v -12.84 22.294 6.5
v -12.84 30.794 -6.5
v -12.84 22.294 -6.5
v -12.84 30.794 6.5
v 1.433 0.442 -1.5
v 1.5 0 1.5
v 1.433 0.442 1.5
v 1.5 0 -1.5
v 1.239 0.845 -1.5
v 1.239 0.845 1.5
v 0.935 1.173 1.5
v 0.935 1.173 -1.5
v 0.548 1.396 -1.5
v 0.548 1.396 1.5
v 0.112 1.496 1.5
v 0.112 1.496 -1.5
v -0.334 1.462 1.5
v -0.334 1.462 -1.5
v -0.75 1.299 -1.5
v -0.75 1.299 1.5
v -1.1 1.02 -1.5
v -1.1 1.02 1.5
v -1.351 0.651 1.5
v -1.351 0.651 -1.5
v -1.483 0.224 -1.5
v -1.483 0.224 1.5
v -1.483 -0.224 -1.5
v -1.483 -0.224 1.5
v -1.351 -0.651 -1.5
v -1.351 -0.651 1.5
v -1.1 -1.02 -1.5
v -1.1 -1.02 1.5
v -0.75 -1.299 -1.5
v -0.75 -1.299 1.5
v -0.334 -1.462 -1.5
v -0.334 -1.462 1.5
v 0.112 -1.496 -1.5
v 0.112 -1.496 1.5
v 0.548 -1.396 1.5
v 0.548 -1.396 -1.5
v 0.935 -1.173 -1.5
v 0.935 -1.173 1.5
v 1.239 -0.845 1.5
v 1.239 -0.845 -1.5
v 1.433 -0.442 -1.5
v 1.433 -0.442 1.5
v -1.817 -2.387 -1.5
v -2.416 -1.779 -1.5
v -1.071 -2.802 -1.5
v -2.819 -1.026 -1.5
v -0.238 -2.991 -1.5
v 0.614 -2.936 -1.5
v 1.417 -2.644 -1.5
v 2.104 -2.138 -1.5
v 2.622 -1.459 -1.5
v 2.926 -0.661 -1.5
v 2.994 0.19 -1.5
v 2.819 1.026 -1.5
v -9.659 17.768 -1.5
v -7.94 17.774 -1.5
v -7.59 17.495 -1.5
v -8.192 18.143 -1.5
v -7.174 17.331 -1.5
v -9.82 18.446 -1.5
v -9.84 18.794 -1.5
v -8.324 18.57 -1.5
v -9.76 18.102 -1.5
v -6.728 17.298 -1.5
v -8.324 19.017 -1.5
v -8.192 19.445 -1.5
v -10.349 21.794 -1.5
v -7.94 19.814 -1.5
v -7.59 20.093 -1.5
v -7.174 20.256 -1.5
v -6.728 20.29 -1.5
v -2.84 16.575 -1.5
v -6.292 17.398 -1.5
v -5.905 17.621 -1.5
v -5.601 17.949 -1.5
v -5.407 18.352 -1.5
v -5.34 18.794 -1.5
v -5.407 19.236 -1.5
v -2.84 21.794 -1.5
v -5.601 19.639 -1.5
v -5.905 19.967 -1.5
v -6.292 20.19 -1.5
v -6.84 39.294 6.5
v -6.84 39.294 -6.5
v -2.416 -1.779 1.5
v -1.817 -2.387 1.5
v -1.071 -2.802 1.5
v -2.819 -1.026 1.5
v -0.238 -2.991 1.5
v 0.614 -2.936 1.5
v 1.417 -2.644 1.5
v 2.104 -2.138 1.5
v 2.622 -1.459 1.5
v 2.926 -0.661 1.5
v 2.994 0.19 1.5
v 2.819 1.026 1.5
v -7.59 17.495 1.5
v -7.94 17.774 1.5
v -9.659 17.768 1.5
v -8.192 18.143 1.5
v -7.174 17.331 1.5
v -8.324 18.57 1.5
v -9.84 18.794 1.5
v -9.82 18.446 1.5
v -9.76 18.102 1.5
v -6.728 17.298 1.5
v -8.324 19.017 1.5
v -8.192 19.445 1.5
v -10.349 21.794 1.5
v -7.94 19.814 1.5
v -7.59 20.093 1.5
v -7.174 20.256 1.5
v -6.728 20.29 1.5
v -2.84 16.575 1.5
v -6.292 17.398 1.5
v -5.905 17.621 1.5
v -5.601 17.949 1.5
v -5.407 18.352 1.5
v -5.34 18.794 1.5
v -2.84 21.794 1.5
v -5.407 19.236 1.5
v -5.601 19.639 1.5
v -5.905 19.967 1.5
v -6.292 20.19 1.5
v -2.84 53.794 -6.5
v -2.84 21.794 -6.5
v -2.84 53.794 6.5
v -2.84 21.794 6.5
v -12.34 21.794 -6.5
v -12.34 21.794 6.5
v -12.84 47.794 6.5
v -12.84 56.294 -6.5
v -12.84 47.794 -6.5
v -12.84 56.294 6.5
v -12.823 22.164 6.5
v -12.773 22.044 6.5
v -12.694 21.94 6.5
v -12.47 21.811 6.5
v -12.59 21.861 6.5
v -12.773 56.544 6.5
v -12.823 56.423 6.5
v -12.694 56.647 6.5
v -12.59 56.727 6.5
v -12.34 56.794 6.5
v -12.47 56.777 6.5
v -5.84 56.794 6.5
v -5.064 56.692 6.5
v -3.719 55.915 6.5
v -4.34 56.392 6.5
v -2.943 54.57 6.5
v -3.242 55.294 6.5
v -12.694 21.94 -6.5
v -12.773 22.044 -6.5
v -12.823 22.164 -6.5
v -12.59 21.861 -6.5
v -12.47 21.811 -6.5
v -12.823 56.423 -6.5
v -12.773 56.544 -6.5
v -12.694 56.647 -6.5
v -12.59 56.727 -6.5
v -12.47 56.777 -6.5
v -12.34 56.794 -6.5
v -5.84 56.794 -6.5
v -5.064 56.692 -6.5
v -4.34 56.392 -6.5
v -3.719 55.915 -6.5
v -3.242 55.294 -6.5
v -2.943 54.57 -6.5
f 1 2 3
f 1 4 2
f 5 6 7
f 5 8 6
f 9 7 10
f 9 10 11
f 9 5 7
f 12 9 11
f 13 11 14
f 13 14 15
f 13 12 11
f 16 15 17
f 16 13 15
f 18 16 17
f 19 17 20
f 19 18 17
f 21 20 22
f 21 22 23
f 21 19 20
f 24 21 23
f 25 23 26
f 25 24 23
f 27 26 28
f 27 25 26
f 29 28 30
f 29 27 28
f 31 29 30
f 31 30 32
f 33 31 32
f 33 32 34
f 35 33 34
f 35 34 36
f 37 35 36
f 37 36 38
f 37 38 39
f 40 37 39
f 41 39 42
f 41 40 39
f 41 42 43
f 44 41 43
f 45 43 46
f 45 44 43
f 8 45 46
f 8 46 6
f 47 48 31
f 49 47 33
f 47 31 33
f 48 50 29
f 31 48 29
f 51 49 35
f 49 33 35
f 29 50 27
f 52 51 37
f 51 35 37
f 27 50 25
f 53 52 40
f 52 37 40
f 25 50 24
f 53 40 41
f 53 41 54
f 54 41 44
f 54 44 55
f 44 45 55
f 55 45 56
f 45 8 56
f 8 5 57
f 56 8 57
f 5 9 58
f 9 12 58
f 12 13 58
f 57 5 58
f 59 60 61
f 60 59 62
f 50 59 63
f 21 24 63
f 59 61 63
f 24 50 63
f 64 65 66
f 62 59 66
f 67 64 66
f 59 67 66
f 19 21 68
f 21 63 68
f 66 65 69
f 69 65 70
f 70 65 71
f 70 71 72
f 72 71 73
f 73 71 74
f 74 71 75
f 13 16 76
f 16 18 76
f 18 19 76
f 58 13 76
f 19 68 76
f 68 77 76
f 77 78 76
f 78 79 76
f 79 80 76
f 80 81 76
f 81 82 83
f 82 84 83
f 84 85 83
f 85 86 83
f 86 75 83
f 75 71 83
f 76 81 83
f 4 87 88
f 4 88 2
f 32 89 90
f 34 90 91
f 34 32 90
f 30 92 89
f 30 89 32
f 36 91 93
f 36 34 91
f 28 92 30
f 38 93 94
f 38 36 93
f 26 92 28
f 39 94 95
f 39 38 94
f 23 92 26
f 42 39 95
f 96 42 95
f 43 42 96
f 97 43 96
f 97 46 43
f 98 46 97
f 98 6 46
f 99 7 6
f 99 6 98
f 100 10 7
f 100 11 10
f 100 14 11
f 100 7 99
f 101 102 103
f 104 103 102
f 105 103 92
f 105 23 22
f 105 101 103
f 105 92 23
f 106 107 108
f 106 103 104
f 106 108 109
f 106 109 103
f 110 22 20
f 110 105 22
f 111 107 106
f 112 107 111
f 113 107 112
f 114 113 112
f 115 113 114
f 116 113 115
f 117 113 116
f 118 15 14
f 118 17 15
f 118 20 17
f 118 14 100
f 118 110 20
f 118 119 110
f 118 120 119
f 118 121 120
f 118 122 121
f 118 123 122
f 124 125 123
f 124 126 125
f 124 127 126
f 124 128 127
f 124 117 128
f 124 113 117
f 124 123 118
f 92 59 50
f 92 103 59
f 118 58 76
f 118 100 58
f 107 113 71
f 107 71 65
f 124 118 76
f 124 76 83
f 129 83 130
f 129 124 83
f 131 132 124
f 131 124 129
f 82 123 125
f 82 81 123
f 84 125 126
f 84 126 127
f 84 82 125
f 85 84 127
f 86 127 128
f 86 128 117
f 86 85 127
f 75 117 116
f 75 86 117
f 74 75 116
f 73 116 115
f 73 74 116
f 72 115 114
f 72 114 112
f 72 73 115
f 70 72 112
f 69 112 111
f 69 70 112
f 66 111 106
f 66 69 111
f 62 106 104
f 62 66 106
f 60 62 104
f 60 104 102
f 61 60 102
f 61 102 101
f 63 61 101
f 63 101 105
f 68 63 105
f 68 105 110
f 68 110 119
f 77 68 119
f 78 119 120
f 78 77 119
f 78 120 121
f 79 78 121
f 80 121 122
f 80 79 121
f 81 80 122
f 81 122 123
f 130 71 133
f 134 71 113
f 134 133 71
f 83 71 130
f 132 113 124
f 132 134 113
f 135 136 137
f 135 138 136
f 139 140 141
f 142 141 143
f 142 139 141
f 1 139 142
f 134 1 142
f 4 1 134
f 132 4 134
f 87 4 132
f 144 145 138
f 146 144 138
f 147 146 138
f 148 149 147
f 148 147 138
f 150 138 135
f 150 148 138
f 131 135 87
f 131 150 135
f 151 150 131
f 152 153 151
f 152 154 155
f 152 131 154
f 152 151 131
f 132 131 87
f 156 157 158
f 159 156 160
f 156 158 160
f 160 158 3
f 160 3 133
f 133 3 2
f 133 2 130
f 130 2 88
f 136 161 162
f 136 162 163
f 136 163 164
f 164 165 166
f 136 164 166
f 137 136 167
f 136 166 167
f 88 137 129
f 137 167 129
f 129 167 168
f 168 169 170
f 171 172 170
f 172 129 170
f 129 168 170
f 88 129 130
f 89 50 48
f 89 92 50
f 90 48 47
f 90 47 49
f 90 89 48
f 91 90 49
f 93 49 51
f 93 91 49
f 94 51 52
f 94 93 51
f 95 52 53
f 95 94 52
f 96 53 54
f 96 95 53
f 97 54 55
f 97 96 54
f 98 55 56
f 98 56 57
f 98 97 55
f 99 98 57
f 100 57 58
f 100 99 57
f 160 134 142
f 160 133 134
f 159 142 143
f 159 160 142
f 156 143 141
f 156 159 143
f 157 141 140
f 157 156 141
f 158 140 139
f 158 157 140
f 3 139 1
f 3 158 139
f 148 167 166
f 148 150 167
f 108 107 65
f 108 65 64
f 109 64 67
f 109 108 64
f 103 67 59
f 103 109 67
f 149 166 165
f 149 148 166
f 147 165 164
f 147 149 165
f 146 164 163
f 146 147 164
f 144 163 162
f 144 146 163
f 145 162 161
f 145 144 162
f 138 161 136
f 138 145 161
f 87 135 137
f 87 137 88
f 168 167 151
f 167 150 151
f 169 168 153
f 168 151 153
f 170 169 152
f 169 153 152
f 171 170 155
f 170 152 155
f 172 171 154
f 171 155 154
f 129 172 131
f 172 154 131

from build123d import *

# Parameters (mm, degrees)
ESTRUSIONE_ESTRUSIONE1_DEPTH      = 1.5
ESTRUSIONE_ESTRUSIONE1_DEPTH_BACK = 1.5
SCHIZZO2_R                        = 1.5
ESTRUSIONE_ESTRUSIONE2_DEPTH      = 6.5
ESTRUSIONE_ESTRUSIONE2_DEPTH_BACK = 6.5
RACCORDO1_R                       = 3
RACCORDO2_R                       = 0.5
RACCORDO3_R                       = 0.5


with BuildPart() as part:
    # Schizzo2 → Estrusione-Estrusione1 (new, two sides: drawn at the far end of the back side and taken through both)
    with BuildSketch(Plane.XY.offset(-ESTRUSIONE_ESTRUSIONE1_DEPTH_BACK)):
        with BuildLine():
            Line((-9.659480729, 17.767791986), (-2.819077862, -1.02606043))
            ThreePointArc((-2.819077862, -1.02606043), (1.02606043, -2.819077862), (2.819077862, 1.02606043))
            Line((2.819077862, 1.02606043), (-2.840402867, 16.575355938))
            Line((-2.840402867, 16.575355938), (-2.840402867, 21.793852416))
            Line((-2.840402867, 21.793852416), (-10.348829971, 21.793852416))
            Line((-10.348829971, 21.793852416), (-9.840402867, 18.793852416))
            ThreePointArc((-9.840402867, 18.793852416), (-9.794826126, 18.272907883), (-9.659480729, 17.767791986))
        make_face()
        with Locations((-6.840402867, 18.793852416)):
            Circle(SCHIZZO2_R, mode=Mode.SUBTRACT)
        Circle(SCHIZZO2_R, mode=Mode.SUBTRACT)
    extrude(amount=ESTRUSIONE_ESTRUSIONE1_DEPTH + ESTRUSIONE_ESTRUSIONE1_DEPTH_BACK)

    # Schizzo2<10> → Estrusione-Estrusione2 (add, two sides: drawn at the far end of the back side and taken through both)
    with BuildSketch(Plane.XY.offset(-ESTRUSIONE_ESTRUSIONE2_DEPTH_BACK)):
        Polygon((-12.840402867, 21.793852416), (-10.348829971, 21.793852416), (-6.840402867, 21.793852416), (-2.840402867, 21.793852416), (-2.840402867, 56.793852416), (-12.840402867, 56.793852416), (-12.840402867, 47.793852416), (-6.840402867, 39.293852416), (-12.840402867, 30.793852416), align=None)
    extrude(amount=ESTRUSIONE_ESTRUSIONE2_DEPTH + ESTRUSIONE_ESTRUSIONE2_DEPTH_BACK)

    # Raccordo1
    raccordo1_edges = [part.edges().sort_by_distance(p)[0] for p in [
        (-2.840402867, 56.793852416, 0),
    ]]
    fillet(raccordo1_edges, radius=RACCORDO1_R)

    # Raccordo2
    raccordo2_edges = [part.edges().sort_by_distance(p)[0] for p in [
        (-12.840402867, 21.793852416, 0),
    ]]
    fillet(raccordo2_edges, radius=RACCORDO2_R)

    # Raccordo3
    raccordo3_edges = [part.edges().sort_by_distance(p)[0] for p in [
        (-12.840402867, 56.793852416, 0),
    ]]
    fillet(raccordo3_edges, radius=RACCORDO3_R)


solid = part.part
